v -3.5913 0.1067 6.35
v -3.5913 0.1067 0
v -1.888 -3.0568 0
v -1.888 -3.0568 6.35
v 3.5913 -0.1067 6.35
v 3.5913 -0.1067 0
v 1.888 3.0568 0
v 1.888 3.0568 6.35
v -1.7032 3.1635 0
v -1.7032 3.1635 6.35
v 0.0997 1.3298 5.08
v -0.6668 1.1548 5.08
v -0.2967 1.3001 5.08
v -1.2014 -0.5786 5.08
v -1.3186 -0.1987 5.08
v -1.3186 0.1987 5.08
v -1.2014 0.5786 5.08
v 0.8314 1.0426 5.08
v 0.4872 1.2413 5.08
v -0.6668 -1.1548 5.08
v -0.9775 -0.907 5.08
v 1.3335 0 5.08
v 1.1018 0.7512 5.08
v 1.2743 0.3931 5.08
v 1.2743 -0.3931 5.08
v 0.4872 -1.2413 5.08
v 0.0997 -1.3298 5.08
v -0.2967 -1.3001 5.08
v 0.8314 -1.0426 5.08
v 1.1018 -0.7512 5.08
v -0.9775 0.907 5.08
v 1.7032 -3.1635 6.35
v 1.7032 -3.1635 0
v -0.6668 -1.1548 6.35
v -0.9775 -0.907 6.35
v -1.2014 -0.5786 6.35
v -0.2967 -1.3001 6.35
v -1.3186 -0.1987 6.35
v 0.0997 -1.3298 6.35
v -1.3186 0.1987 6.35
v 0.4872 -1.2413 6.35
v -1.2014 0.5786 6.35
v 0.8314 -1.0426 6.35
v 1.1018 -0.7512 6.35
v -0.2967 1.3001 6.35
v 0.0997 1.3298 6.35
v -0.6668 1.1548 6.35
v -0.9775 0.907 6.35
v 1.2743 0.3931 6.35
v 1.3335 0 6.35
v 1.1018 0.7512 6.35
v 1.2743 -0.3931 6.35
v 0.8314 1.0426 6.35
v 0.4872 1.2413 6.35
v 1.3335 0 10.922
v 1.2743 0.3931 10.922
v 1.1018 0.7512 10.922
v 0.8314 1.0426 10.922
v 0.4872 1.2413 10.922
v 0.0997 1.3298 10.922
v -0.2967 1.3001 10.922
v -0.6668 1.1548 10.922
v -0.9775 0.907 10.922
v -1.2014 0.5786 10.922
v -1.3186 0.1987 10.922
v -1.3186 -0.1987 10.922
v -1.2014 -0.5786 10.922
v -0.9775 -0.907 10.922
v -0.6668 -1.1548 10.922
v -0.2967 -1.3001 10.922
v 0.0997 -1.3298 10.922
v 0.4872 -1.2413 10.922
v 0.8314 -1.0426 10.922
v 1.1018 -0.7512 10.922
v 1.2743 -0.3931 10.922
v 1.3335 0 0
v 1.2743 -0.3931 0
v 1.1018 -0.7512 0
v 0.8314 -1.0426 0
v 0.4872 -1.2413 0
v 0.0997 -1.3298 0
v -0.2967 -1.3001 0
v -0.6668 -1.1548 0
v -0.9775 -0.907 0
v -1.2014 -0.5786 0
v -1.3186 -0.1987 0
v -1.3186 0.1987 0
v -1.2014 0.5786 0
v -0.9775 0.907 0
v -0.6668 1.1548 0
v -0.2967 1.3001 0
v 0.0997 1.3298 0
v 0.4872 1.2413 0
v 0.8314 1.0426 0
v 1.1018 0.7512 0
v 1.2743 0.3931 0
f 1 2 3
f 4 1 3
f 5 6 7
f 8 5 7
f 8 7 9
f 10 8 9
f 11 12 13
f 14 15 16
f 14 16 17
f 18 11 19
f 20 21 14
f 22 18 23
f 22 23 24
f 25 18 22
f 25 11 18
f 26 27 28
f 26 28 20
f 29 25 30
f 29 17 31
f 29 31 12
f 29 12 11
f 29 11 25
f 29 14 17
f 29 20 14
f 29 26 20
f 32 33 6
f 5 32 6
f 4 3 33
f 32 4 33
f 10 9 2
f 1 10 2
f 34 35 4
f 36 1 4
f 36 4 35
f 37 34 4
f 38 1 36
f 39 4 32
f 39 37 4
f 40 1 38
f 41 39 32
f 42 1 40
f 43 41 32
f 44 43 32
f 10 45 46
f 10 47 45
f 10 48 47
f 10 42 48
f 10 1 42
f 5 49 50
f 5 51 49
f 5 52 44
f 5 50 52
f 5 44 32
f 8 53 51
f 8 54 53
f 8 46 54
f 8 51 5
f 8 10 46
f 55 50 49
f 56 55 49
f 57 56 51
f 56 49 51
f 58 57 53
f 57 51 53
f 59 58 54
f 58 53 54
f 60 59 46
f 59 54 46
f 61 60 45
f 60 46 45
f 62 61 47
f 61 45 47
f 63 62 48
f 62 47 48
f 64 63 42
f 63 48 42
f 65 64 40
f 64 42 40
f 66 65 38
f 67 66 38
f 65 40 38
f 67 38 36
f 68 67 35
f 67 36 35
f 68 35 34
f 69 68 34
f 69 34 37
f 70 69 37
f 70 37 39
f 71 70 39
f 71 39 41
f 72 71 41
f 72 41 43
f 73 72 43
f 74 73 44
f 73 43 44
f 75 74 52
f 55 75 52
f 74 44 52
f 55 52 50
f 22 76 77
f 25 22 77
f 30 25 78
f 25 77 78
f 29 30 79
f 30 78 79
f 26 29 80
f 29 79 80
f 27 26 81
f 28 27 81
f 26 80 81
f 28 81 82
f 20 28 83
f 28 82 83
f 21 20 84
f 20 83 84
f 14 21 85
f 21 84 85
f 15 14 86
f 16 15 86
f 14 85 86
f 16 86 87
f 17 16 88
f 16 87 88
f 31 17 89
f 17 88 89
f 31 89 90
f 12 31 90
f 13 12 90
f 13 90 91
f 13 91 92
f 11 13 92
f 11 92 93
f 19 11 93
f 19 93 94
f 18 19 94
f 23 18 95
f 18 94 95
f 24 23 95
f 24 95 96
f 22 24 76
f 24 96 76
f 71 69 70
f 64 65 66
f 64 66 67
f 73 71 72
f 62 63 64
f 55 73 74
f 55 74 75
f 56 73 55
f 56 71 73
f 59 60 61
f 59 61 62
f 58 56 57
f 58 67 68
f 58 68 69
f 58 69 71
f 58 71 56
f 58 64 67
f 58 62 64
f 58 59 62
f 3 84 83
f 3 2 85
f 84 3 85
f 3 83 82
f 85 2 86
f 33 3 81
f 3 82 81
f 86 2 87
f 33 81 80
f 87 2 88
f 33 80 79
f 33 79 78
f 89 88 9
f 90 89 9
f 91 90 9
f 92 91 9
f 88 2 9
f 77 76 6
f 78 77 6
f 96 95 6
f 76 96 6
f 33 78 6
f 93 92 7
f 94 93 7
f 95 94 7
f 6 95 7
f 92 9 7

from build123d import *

# Parameters (mm, degrees)
EXTRUDE1_DEPTH = 6.35
SKETCH2_R      = 1.3335
EXTRUDE2_DEPTH = 4.572
SKETCH3_R      = 1.3335
EXTRUDE3_DEPTH = 5.08


with BuildPart() as part:
    # Sketch1 → Extrude1 (new body)
    with BuildSketch(Plane.XY):
        Polygon((1.888017478, 3.056790202), (-1.70324923, 3.163466199), (-3.591266708, 0.106675997), (-1.888017478, -3.056790202), (1.70324923, -3.163466199), (3.591266708, -0.106675997), align=None)
    extrude(amount=EXTRUDE1_DEPTH)

    # Sketch2 → Extrude2 (add)
    with BuildSketch(Plane.XY.offset(6.35)):
        Circle(SKETCH2_R)
    extrude(amount=EXTRUDE2_DEPTH)

    # Sketch3 → Extrude3 (cut)
    with BuildSketch(Plane(origin=(0, 0, 0), x_dir=(-1, 0, 0), z_dir=(0, 0, -1))):
        with Locations(Location((0, 0, 0), (0, 0, 180))):
            Circle(SKETCH3_R)
    extrude(amount=-EXTRUDE3_DEPTH, mode=Mode.SUBTRACT)


solid = part.part
